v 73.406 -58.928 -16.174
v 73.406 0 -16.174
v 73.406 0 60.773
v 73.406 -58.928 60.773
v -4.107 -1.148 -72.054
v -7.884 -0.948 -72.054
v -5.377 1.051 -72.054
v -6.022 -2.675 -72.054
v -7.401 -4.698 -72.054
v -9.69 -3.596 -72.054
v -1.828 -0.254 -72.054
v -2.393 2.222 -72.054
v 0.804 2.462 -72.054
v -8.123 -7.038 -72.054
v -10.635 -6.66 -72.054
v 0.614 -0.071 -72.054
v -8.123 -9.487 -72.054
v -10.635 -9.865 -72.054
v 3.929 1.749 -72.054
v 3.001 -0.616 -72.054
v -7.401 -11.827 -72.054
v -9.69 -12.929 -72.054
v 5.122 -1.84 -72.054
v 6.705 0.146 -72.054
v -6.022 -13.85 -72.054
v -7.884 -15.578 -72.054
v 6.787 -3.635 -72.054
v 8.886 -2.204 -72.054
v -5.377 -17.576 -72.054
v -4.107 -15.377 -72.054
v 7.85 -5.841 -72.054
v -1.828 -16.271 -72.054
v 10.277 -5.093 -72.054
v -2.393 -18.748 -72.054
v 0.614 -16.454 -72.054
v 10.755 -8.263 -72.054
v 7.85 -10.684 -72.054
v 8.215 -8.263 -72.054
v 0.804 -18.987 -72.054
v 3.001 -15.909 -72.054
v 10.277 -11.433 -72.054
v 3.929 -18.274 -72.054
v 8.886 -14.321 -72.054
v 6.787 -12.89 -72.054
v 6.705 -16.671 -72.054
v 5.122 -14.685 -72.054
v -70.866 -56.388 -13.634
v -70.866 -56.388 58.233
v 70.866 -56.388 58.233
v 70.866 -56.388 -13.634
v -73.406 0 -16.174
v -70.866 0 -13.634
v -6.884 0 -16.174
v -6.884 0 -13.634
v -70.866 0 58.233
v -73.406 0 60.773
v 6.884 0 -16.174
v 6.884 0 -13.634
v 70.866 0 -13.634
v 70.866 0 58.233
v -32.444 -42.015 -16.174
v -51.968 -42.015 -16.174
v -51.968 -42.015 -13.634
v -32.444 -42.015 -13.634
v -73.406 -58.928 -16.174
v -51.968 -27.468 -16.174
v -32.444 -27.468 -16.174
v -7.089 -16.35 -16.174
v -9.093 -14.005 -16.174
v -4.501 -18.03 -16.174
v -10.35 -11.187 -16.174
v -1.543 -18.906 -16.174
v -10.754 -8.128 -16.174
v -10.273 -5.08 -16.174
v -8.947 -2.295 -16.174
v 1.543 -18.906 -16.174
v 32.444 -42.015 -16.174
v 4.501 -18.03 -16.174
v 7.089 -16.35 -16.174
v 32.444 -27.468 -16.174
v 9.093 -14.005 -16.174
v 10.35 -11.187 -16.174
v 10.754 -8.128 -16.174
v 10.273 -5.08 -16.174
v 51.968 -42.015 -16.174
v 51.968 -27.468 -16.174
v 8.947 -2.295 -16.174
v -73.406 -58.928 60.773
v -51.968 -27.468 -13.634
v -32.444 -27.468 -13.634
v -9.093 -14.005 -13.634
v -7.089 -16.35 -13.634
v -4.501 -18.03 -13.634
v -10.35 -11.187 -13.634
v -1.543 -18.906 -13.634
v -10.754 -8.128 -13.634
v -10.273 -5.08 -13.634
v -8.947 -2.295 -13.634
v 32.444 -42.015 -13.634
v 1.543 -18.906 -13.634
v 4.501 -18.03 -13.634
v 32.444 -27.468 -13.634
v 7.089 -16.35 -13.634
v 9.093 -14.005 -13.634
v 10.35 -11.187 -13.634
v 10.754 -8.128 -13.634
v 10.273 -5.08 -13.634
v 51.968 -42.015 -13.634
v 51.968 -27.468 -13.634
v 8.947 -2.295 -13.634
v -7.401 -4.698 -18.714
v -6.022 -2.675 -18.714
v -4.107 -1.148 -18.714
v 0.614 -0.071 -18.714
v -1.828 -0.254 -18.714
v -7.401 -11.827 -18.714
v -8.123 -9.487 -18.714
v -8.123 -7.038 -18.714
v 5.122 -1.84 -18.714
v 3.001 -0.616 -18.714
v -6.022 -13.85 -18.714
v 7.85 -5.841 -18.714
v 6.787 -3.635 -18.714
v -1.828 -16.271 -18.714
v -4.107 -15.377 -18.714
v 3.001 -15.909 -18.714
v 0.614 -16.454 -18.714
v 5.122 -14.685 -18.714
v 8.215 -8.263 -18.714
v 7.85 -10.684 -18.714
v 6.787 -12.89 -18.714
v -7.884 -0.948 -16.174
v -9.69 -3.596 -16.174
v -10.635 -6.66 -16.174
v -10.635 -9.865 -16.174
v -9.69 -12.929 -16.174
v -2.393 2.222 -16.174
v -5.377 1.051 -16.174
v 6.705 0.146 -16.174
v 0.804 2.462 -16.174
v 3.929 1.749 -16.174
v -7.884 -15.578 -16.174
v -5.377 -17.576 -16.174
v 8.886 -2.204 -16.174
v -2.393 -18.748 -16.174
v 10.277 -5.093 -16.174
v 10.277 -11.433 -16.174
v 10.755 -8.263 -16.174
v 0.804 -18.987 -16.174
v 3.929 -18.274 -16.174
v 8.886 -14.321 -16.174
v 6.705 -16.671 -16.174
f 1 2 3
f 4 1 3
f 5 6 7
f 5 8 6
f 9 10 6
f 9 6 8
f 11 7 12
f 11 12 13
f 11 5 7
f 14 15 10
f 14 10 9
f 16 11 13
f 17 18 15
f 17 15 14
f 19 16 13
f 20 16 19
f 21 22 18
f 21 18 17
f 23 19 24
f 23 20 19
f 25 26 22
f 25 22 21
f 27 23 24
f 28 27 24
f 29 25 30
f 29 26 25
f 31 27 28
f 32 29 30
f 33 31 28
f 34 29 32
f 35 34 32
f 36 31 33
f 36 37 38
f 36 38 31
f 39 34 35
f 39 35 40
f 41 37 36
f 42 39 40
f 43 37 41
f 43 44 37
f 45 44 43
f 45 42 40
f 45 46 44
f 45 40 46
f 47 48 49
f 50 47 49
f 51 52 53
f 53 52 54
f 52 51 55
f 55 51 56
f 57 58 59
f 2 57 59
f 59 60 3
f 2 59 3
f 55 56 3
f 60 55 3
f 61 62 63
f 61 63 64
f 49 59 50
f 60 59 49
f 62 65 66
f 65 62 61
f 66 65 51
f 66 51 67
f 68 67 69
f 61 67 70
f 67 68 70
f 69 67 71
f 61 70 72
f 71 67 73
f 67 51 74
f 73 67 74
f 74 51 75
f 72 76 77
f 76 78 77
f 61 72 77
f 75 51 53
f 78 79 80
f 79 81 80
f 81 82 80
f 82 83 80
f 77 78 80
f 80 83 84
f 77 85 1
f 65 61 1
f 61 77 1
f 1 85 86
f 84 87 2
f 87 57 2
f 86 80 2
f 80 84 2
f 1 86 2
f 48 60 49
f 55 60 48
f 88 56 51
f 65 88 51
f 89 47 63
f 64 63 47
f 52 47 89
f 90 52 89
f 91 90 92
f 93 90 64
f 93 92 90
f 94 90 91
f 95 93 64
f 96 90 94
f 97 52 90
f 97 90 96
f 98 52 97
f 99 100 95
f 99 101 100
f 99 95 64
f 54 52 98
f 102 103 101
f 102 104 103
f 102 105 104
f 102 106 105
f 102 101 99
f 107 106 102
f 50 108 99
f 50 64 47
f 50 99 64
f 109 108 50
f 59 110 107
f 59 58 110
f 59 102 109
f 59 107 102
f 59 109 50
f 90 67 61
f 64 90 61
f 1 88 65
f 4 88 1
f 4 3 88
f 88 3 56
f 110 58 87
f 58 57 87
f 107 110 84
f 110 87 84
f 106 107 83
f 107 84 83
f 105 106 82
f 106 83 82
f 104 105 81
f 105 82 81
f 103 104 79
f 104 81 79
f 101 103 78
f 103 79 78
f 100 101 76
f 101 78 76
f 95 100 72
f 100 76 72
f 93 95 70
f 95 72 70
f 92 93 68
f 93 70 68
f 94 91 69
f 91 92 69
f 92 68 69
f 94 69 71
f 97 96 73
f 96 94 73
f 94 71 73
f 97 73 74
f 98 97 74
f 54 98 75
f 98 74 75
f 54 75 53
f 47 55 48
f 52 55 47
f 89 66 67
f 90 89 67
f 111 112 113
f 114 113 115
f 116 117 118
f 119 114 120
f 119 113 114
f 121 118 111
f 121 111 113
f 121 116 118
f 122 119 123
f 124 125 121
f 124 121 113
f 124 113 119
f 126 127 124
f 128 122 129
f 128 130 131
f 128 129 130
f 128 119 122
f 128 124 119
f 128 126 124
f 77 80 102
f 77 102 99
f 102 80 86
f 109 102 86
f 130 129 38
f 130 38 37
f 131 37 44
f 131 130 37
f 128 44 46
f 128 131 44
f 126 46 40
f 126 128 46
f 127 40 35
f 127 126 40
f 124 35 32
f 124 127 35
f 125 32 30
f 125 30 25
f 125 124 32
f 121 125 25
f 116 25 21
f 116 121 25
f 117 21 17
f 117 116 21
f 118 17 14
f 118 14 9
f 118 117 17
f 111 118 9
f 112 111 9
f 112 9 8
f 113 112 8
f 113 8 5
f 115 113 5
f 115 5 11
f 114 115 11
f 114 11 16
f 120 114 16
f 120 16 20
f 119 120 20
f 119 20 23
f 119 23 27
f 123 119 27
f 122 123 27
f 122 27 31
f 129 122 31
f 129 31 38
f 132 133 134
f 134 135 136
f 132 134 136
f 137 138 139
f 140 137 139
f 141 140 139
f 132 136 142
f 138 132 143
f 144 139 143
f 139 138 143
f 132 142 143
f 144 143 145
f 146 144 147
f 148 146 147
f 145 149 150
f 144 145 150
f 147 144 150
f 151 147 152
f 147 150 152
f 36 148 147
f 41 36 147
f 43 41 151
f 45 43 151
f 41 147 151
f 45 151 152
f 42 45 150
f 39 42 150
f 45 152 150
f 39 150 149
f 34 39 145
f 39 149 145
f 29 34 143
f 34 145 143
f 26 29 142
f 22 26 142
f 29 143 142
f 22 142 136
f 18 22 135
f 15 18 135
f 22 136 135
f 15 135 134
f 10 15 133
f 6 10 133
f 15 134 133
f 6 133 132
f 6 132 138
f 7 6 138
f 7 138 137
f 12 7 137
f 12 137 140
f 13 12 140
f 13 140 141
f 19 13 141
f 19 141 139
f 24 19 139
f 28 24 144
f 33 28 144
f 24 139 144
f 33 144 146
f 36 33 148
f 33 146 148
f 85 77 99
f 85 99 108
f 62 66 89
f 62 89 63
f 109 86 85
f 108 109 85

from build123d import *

# Parameters (mm, degrees)
F1_DEPTH = 58.928
F2_T     = -2.54
F3_R     = 10.754682
F4_DEPTH = 33.528
F5_DEPTH = 55.88
F6_T     = -2.54
F7_W     = 19.523971
F7_H     = 14.54727
F8_DEPTH = 31.496


with BuildPart() as f1:
    # F0 (on Front) → F1 (new body)
    with BuildSketch(Plane.XZ):
        with BuildLine():
            Line((73.406301, 60.773149), (-73.406301, 60.773149))
            Line((-73.406301, 60.773149), (-73.406301, -16.174272))
            Line((-73.406301, -16.174272), (-7.560753, -16.174272))
            ThreePointArc((-7.560753, -16.174272), (-0.957058, 0.04856), (5.646638, -16.174272))
            Line((5.646638, -16.174272), (73.406301, -16.174272))
            Line((73.406301, -16.174272), (73.406301, 60.773149))
        make_face()
        with BuildLine():
            ThreePointArc((5.646638, -16.174272), (-0.957058, 0.04856), (-7.560753, -16.174272))
            Line((-7.560753, -16.174272), (5.646638, -16.174272))
        make_face()
    extrude(amount=F1_DEPTH)

    # F2
    f2_openings = [f1.faces().sort_by_distance(p)[0] for p in [
        (0, 0, 22.299439),
    ]]
    offset(amount=F2_T, openings=f2_openings)

    # F3 (on face) → F4 (cut)
    with BuildSketch(Plane(origin=(0, 0, -16.174272), x_dir=(1, 0, 0), z_dir=(0, 0, -1))):
        with Locations((0, 8.262556)):
            Circle(F3_R)
    extrude(amount=-F4_DEPTH, mode=Mode.SUBTRACT)

    # F7 (on face) → F8 (cut)
    with BuildSketch(Plane(origin=(0, 0, -16.174272), x_dir=(1, 0, 0), z_dir=(0, 0, -1))):
        with Locations((42.206232, 34.741184)):
            Rectangle(F7_W, F7_H)
        with Locations((-42.206232, 34.741184)):
            Rectangle(F7_W, F7_H)
    extrude(amount=-F8_DEPTH, mode=Mode.SUBTRACT)


with BuildPart() as f5:
    # F3 (on face) → F5 (new body)
    with BuildSketch(Plane(origin=(0, 0, -16.174272), x_dir=(1, 0, 0), z_dir=(0, 0, -1))):
        with Locations((0, 8.262556)):
            Circle(F3_R)
    extrude(amount=F5_DEPTH)

    # F6
    f6_openings = [f5.faces().sort_by_distance(p)[0] for p in [
        (0, -8.262556, -72.054272),
    ]]
    offset(amount=F6_T, openings=f6_openings)


solid = Compound([f1.part, f5.part])
